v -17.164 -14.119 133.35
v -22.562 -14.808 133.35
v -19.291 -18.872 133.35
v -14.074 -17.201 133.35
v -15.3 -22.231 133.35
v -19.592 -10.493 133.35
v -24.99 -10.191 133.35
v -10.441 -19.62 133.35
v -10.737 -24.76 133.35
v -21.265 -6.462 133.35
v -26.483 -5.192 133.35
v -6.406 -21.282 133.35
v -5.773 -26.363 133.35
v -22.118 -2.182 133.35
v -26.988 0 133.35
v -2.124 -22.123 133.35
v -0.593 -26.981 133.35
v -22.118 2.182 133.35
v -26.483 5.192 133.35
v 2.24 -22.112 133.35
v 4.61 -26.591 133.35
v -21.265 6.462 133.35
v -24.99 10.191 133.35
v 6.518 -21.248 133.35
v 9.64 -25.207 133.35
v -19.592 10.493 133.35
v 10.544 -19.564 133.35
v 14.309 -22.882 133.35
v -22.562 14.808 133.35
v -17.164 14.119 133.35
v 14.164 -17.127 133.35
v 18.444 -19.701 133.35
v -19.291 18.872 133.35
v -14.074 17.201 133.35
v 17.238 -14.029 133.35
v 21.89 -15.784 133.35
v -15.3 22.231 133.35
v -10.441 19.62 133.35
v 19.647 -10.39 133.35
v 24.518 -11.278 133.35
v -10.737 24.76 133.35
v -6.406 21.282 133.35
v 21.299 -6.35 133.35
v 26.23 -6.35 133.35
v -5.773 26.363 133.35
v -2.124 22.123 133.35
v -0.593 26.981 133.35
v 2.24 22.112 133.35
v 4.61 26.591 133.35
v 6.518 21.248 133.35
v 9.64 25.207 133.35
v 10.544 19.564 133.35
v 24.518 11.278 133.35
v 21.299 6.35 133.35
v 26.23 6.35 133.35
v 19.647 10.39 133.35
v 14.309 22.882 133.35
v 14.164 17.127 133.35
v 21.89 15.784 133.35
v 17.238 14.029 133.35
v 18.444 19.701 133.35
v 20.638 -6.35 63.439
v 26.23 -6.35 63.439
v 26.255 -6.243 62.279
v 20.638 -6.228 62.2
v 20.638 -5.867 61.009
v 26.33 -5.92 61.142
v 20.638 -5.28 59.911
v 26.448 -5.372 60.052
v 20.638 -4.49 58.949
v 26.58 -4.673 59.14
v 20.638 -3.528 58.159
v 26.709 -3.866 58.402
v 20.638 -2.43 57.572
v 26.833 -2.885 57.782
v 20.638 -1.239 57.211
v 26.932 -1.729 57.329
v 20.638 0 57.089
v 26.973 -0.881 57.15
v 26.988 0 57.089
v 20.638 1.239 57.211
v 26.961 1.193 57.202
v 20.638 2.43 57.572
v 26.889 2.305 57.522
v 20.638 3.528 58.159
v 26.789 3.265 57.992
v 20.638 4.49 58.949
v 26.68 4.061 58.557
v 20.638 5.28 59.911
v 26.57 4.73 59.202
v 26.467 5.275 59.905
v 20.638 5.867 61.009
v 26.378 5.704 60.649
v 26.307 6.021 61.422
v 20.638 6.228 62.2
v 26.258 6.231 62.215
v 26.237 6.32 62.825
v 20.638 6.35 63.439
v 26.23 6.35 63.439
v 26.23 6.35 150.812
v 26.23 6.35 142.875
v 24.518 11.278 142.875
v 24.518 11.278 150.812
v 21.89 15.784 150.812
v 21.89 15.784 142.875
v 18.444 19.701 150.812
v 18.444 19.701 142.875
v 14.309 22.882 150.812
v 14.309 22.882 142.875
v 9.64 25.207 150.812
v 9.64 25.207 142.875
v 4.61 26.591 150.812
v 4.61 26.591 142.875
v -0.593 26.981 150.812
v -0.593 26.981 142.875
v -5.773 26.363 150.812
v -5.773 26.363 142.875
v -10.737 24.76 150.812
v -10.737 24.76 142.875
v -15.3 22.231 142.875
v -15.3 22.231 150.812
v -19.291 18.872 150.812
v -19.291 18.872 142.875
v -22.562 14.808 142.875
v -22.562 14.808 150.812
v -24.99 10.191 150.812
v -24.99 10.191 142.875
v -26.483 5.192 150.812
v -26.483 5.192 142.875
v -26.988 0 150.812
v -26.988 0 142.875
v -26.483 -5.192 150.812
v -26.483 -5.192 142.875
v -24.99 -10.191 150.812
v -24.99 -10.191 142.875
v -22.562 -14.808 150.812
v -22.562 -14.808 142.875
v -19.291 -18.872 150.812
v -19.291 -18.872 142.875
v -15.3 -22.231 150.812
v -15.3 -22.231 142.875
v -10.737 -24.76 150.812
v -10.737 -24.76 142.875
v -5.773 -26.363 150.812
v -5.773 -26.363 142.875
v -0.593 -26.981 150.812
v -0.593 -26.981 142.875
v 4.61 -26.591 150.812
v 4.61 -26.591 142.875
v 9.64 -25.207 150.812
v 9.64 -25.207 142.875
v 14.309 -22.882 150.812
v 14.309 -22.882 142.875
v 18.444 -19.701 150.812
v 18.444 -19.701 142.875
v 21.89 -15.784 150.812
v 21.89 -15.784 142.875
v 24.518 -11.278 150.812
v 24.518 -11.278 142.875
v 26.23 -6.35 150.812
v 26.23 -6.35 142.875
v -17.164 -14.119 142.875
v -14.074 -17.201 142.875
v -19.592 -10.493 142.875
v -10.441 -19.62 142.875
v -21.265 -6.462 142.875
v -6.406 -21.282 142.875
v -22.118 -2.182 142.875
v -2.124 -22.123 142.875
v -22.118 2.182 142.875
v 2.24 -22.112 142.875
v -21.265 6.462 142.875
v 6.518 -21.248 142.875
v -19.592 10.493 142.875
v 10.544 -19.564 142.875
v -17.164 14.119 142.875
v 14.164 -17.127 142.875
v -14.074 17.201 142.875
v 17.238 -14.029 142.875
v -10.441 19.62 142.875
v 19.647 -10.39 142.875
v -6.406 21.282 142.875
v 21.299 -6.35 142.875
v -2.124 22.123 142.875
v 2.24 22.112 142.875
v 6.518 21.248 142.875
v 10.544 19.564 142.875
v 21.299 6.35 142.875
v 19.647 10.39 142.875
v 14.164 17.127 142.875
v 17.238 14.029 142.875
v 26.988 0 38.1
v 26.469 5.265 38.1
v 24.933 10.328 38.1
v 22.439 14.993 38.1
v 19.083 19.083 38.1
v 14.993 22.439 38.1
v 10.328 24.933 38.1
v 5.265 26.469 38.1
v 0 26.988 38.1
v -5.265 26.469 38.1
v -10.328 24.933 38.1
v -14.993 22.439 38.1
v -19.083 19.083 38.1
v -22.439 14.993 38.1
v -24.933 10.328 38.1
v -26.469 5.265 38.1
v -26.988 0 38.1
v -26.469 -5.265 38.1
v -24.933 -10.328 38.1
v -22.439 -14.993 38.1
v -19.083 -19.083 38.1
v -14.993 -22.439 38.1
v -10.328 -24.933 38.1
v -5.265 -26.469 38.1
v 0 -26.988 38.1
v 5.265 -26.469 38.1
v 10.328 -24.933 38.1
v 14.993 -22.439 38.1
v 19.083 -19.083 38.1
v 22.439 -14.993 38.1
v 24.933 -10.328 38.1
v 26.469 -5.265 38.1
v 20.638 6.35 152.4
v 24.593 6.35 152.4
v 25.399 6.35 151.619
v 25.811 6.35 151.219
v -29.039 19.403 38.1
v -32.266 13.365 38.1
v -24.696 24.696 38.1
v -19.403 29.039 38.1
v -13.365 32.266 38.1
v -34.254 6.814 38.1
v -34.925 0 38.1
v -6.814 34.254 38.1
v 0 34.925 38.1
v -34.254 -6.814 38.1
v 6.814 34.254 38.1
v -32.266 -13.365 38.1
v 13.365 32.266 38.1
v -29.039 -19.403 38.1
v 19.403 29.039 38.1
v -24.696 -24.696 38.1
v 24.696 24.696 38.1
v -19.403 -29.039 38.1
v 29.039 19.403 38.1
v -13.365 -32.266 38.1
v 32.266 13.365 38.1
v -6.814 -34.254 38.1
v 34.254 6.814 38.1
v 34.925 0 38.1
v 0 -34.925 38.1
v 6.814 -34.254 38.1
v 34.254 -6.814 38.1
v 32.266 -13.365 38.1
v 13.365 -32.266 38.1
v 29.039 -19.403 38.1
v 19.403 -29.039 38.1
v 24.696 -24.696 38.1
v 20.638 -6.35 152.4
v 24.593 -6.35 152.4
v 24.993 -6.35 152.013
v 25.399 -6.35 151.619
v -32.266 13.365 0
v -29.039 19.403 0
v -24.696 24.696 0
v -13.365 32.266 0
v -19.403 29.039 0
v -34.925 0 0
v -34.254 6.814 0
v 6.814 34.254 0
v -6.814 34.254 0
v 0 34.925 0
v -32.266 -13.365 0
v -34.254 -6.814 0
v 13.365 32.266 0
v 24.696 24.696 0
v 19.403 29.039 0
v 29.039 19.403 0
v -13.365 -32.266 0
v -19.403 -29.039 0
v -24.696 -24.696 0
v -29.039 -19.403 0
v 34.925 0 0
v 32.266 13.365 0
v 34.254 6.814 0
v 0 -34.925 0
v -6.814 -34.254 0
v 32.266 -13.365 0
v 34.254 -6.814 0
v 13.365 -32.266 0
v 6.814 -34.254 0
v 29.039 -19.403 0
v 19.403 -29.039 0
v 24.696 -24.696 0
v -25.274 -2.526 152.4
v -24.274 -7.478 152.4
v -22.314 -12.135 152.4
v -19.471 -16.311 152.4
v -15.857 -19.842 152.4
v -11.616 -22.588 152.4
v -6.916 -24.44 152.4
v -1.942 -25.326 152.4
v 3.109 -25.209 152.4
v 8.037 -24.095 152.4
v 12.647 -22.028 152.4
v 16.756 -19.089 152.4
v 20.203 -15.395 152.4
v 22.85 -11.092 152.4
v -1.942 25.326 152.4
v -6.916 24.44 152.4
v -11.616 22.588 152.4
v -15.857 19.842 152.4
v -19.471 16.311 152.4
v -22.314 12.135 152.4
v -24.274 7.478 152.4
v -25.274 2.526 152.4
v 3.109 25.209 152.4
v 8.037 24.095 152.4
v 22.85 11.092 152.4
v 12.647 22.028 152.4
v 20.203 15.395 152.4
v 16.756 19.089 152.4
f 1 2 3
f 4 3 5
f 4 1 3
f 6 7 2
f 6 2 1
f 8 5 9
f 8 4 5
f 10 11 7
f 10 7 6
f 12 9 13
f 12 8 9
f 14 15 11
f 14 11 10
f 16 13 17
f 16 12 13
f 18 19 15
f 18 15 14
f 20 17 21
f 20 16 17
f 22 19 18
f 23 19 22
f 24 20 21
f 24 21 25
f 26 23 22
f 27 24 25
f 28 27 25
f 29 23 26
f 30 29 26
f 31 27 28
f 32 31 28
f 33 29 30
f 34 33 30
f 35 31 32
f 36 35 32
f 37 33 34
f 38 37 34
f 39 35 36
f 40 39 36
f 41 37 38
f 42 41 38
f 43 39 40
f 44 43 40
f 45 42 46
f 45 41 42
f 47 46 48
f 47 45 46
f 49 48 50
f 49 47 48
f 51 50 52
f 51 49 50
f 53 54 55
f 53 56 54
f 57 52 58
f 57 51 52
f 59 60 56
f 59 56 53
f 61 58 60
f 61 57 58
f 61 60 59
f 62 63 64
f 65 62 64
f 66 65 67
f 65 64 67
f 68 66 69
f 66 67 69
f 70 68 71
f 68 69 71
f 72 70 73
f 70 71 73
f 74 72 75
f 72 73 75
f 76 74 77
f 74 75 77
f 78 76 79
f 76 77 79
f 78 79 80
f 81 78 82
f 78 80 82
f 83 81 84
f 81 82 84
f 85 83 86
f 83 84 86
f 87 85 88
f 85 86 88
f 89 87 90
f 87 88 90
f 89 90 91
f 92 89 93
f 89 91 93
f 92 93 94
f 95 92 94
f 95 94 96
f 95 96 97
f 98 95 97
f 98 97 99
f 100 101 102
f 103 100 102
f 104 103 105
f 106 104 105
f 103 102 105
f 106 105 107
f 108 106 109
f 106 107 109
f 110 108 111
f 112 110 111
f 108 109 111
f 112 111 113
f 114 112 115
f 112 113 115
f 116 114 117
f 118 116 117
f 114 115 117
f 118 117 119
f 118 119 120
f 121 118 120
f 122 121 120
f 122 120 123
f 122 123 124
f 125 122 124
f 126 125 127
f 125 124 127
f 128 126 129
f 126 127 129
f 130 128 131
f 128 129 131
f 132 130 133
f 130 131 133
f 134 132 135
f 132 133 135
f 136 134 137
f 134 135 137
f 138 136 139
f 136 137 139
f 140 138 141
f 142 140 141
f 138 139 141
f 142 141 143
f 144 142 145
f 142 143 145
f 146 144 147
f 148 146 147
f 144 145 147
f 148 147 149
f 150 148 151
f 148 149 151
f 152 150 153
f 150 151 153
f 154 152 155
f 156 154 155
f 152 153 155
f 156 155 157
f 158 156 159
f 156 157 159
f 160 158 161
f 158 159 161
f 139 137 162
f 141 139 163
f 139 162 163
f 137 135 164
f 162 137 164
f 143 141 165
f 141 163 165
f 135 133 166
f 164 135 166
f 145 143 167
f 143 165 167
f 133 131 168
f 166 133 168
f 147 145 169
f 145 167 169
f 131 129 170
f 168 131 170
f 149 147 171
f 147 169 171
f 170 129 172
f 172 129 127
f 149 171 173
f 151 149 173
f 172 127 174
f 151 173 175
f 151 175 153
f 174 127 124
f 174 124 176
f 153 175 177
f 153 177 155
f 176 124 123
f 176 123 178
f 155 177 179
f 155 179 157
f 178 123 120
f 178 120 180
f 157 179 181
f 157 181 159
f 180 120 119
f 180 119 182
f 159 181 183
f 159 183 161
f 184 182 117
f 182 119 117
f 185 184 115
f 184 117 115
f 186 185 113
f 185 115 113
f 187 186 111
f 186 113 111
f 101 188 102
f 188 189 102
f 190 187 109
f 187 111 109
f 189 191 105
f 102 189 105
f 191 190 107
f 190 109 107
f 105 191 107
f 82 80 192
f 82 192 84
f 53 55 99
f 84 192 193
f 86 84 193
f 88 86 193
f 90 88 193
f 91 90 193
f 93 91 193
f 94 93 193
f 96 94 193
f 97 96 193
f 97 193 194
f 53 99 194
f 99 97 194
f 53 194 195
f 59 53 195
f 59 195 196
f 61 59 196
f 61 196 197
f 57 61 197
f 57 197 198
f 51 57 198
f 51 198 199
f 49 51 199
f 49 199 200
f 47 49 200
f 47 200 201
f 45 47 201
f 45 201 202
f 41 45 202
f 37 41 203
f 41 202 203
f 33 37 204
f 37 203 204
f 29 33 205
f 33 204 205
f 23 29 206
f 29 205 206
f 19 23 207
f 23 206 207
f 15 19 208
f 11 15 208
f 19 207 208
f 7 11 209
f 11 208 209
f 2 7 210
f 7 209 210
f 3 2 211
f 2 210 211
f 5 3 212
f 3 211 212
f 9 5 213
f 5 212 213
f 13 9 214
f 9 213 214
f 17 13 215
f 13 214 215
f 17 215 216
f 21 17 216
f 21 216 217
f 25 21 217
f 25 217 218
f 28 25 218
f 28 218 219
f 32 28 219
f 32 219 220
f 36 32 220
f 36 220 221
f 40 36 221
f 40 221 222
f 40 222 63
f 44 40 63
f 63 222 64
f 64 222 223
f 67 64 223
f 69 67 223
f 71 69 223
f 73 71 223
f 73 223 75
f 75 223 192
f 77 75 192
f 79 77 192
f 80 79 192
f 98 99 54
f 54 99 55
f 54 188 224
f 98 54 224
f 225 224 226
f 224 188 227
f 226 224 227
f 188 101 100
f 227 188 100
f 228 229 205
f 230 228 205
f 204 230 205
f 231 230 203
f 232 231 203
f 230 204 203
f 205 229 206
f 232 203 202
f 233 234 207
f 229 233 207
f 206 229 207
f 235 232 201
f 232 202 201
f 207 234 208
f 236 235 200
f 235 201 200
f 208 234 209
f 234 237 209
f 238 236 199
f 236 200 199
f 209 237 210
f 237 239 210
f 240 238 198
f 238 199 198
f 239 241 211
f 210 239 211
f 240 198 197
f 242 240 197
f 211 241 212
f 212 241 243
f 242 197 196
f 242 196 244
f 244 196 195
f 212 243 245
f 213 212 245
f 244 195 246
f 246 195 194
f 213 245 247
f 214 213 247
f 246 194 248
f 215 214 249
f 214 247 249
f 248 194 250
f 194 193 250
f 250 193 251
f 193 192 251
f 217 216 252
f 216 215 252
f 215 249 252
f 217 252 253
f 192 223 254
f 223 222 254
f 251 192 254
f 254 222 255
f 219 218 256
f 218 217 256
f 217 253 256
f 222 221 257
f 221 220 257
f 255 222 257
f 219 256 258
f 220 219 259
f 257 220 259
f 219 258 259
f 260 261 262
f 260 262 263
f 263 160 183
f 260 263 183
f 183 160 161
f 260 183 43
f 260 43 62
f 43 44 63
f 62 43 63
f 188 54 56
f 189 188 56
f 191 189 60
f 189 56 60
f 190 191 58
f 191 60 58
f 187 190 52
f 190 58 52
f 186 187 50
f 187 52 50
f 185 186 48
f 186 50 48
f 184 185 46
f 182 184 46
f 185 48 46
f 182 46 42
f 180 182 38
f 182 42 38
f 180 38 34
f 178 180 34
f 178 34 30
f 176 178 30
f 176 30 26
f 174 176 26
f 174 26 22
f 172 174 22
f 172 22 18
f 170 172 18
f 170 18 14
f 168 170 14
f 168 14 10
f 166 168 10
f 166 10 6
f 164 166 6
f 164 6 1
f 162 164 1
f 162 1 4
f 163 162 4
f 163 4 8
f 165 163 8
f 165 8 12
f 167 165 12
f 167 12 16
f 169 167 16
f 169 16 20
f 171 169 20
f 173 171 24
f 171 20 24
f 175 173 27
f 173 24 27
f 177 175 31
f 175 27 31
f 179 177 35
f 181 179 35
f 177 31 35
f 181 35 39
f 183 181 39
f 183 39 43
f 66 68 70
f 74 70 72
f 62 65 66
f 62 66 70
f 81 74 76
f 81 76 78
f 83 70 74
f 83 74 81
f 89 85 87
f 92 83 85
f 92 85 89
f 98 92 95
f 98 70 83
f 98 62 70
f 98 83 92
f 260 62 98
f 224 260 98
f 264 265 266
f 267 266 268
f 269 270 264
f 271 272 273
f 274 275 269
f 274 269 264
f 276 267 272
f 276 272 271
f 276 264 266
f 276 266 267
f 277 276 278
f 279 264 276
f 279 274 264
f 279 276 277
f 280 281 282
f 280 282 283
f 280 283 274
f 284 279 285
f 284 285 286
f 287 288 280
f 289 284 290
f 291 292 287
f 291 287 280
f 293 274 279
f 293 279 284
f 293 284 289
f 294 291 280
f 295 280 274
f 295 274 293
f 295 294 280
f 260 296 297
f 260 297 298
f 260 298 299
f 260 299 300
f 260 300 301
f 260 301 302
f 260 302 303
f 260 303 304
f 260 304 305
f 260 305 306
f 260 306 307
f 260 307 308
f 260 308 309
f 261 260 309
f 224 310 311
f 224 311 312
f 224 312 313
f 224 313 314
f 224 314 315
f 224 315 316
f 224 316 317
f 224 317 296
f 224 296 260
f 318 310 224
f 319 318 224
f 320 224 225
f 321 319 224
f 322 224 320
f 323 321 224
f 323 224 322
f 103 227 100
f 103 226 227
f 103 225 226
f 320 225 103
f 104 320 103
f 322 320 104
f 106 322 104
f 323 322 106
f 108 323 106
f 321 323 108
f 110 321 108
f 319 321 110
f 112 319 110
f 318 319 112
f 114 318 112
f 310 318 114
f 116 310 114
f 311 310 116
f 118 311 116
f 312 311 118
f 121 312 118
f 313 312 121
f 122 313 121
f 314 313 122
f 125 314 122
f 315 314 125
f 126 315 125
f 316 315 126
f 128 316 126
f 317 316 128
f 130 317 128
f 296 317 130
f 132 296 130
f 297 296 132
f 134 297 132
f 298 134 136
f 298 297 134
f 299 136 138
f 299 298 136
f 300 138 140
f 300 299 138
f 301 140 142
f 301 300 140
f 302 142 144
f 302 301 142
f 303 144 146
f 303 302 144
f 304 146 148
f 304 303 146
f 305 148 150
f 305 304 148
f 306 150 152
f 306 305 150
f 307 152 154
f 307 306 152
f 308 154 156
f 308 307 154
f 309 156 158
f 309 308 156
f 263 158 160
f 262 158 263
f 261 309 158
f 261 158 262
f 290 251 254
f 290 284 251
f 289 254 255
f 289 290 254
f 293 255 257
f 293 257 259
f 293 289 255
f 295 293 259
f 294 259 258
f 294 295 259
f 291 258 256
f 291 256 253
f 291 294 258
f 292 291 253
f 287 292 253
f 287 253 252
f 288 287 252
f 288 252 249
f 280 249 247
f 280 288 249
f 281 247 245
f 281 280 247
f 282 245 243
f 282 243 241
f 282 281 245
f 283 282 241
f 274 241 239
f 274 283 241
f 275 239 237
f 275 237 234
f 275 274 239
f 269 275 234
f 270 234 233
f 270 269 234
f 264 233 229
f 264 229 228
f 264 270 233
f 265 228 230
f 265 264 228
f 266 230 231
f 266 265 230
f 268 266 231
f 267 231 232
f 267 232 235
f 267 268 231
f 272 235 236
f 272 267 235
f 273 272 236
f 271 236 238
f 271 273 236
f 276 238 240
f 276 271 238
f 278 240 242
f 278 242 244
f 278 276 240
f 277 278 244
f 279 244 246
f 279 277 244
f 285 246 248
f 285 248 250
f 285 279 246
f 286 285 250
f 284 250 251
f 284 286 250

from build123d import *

# Parameters (mm, degrees)
F0_R      = 26.9875
F1_DEPTH  = 133.35
F2_R      = 22.225
F3_DEPTH  = 9.525
F4_R      = 26.9875
F5_DEPTH  = 9.525
F6_SIZE   = 1.5875
F9_DEPTH  = 9.525
F10_R     = 34.925
F11_DEPTH = 25.4
F12_DEPTH = 12.7


with BuildPart() as f1:
    # F0 (on Top) → F1 (new body)
    with BuildSketch(Plane.XY):
        Circle(F0_R)
    extrude(amount=F1_DEPTH)

    # F2 (on face) → F3 (join)
    with BuildSketch(Plane.XY.offset(133.35)):
        Circle(F2_R)
    extrude(amount=F3_DEPTH)

    # F4 (on face) → F5 (join)
    with BuildSketch(Plane.XY.offset(142.875)):
        Circle(F4_R)
    extrude(amount=F5_DEPTH)

    # F6
    f6_edges = [f1.edges().sort_by_distance(p)[0] for p in [
        (-26.9875, 0, 152.4),
    ]]
    chamfer(f6_edges, length=F6_SIZE)

    # F8 (on offset) → F9 (cut)
    with BuildSketch(Plane.YZ.offset(30.1625)):
        with BuildLine():
            Line((6.35, 63.4389315911), (6.35, 152.5463323689))
            Line((6.35, 152.5463323689), (-6.35, 152.5463323689))
            Line((-6.35, 152.5463323689), (-6.35, 63.4389315911))
            ThreePointArc((-6.35, 63.4389315911), (0, 57.0889315911), (6.35, 63.4389315911))
        make_face()
    extrude(amount=-F9_DEPTH, mode=Mode.SUBTRACT)

    # F10 (on face) → F11 (join)
    with BuildSketch(Plane(origin=(0, 0, 0), x_dir=(1, 0, 0), z_dir=(0, 0, -1))):
        Circle(F10_R)
    extrude(amount=-F11_DEPTH)

    # F12 (add): a face of the model
    f12_faces = [f1.faces().sort_by_distance(p)[0] for p in [
        (-33.9371718267, 0, 25.4),
    ]]
    extrude(f12_faces, amount=F12_DEPTH)


solid = f1.part
